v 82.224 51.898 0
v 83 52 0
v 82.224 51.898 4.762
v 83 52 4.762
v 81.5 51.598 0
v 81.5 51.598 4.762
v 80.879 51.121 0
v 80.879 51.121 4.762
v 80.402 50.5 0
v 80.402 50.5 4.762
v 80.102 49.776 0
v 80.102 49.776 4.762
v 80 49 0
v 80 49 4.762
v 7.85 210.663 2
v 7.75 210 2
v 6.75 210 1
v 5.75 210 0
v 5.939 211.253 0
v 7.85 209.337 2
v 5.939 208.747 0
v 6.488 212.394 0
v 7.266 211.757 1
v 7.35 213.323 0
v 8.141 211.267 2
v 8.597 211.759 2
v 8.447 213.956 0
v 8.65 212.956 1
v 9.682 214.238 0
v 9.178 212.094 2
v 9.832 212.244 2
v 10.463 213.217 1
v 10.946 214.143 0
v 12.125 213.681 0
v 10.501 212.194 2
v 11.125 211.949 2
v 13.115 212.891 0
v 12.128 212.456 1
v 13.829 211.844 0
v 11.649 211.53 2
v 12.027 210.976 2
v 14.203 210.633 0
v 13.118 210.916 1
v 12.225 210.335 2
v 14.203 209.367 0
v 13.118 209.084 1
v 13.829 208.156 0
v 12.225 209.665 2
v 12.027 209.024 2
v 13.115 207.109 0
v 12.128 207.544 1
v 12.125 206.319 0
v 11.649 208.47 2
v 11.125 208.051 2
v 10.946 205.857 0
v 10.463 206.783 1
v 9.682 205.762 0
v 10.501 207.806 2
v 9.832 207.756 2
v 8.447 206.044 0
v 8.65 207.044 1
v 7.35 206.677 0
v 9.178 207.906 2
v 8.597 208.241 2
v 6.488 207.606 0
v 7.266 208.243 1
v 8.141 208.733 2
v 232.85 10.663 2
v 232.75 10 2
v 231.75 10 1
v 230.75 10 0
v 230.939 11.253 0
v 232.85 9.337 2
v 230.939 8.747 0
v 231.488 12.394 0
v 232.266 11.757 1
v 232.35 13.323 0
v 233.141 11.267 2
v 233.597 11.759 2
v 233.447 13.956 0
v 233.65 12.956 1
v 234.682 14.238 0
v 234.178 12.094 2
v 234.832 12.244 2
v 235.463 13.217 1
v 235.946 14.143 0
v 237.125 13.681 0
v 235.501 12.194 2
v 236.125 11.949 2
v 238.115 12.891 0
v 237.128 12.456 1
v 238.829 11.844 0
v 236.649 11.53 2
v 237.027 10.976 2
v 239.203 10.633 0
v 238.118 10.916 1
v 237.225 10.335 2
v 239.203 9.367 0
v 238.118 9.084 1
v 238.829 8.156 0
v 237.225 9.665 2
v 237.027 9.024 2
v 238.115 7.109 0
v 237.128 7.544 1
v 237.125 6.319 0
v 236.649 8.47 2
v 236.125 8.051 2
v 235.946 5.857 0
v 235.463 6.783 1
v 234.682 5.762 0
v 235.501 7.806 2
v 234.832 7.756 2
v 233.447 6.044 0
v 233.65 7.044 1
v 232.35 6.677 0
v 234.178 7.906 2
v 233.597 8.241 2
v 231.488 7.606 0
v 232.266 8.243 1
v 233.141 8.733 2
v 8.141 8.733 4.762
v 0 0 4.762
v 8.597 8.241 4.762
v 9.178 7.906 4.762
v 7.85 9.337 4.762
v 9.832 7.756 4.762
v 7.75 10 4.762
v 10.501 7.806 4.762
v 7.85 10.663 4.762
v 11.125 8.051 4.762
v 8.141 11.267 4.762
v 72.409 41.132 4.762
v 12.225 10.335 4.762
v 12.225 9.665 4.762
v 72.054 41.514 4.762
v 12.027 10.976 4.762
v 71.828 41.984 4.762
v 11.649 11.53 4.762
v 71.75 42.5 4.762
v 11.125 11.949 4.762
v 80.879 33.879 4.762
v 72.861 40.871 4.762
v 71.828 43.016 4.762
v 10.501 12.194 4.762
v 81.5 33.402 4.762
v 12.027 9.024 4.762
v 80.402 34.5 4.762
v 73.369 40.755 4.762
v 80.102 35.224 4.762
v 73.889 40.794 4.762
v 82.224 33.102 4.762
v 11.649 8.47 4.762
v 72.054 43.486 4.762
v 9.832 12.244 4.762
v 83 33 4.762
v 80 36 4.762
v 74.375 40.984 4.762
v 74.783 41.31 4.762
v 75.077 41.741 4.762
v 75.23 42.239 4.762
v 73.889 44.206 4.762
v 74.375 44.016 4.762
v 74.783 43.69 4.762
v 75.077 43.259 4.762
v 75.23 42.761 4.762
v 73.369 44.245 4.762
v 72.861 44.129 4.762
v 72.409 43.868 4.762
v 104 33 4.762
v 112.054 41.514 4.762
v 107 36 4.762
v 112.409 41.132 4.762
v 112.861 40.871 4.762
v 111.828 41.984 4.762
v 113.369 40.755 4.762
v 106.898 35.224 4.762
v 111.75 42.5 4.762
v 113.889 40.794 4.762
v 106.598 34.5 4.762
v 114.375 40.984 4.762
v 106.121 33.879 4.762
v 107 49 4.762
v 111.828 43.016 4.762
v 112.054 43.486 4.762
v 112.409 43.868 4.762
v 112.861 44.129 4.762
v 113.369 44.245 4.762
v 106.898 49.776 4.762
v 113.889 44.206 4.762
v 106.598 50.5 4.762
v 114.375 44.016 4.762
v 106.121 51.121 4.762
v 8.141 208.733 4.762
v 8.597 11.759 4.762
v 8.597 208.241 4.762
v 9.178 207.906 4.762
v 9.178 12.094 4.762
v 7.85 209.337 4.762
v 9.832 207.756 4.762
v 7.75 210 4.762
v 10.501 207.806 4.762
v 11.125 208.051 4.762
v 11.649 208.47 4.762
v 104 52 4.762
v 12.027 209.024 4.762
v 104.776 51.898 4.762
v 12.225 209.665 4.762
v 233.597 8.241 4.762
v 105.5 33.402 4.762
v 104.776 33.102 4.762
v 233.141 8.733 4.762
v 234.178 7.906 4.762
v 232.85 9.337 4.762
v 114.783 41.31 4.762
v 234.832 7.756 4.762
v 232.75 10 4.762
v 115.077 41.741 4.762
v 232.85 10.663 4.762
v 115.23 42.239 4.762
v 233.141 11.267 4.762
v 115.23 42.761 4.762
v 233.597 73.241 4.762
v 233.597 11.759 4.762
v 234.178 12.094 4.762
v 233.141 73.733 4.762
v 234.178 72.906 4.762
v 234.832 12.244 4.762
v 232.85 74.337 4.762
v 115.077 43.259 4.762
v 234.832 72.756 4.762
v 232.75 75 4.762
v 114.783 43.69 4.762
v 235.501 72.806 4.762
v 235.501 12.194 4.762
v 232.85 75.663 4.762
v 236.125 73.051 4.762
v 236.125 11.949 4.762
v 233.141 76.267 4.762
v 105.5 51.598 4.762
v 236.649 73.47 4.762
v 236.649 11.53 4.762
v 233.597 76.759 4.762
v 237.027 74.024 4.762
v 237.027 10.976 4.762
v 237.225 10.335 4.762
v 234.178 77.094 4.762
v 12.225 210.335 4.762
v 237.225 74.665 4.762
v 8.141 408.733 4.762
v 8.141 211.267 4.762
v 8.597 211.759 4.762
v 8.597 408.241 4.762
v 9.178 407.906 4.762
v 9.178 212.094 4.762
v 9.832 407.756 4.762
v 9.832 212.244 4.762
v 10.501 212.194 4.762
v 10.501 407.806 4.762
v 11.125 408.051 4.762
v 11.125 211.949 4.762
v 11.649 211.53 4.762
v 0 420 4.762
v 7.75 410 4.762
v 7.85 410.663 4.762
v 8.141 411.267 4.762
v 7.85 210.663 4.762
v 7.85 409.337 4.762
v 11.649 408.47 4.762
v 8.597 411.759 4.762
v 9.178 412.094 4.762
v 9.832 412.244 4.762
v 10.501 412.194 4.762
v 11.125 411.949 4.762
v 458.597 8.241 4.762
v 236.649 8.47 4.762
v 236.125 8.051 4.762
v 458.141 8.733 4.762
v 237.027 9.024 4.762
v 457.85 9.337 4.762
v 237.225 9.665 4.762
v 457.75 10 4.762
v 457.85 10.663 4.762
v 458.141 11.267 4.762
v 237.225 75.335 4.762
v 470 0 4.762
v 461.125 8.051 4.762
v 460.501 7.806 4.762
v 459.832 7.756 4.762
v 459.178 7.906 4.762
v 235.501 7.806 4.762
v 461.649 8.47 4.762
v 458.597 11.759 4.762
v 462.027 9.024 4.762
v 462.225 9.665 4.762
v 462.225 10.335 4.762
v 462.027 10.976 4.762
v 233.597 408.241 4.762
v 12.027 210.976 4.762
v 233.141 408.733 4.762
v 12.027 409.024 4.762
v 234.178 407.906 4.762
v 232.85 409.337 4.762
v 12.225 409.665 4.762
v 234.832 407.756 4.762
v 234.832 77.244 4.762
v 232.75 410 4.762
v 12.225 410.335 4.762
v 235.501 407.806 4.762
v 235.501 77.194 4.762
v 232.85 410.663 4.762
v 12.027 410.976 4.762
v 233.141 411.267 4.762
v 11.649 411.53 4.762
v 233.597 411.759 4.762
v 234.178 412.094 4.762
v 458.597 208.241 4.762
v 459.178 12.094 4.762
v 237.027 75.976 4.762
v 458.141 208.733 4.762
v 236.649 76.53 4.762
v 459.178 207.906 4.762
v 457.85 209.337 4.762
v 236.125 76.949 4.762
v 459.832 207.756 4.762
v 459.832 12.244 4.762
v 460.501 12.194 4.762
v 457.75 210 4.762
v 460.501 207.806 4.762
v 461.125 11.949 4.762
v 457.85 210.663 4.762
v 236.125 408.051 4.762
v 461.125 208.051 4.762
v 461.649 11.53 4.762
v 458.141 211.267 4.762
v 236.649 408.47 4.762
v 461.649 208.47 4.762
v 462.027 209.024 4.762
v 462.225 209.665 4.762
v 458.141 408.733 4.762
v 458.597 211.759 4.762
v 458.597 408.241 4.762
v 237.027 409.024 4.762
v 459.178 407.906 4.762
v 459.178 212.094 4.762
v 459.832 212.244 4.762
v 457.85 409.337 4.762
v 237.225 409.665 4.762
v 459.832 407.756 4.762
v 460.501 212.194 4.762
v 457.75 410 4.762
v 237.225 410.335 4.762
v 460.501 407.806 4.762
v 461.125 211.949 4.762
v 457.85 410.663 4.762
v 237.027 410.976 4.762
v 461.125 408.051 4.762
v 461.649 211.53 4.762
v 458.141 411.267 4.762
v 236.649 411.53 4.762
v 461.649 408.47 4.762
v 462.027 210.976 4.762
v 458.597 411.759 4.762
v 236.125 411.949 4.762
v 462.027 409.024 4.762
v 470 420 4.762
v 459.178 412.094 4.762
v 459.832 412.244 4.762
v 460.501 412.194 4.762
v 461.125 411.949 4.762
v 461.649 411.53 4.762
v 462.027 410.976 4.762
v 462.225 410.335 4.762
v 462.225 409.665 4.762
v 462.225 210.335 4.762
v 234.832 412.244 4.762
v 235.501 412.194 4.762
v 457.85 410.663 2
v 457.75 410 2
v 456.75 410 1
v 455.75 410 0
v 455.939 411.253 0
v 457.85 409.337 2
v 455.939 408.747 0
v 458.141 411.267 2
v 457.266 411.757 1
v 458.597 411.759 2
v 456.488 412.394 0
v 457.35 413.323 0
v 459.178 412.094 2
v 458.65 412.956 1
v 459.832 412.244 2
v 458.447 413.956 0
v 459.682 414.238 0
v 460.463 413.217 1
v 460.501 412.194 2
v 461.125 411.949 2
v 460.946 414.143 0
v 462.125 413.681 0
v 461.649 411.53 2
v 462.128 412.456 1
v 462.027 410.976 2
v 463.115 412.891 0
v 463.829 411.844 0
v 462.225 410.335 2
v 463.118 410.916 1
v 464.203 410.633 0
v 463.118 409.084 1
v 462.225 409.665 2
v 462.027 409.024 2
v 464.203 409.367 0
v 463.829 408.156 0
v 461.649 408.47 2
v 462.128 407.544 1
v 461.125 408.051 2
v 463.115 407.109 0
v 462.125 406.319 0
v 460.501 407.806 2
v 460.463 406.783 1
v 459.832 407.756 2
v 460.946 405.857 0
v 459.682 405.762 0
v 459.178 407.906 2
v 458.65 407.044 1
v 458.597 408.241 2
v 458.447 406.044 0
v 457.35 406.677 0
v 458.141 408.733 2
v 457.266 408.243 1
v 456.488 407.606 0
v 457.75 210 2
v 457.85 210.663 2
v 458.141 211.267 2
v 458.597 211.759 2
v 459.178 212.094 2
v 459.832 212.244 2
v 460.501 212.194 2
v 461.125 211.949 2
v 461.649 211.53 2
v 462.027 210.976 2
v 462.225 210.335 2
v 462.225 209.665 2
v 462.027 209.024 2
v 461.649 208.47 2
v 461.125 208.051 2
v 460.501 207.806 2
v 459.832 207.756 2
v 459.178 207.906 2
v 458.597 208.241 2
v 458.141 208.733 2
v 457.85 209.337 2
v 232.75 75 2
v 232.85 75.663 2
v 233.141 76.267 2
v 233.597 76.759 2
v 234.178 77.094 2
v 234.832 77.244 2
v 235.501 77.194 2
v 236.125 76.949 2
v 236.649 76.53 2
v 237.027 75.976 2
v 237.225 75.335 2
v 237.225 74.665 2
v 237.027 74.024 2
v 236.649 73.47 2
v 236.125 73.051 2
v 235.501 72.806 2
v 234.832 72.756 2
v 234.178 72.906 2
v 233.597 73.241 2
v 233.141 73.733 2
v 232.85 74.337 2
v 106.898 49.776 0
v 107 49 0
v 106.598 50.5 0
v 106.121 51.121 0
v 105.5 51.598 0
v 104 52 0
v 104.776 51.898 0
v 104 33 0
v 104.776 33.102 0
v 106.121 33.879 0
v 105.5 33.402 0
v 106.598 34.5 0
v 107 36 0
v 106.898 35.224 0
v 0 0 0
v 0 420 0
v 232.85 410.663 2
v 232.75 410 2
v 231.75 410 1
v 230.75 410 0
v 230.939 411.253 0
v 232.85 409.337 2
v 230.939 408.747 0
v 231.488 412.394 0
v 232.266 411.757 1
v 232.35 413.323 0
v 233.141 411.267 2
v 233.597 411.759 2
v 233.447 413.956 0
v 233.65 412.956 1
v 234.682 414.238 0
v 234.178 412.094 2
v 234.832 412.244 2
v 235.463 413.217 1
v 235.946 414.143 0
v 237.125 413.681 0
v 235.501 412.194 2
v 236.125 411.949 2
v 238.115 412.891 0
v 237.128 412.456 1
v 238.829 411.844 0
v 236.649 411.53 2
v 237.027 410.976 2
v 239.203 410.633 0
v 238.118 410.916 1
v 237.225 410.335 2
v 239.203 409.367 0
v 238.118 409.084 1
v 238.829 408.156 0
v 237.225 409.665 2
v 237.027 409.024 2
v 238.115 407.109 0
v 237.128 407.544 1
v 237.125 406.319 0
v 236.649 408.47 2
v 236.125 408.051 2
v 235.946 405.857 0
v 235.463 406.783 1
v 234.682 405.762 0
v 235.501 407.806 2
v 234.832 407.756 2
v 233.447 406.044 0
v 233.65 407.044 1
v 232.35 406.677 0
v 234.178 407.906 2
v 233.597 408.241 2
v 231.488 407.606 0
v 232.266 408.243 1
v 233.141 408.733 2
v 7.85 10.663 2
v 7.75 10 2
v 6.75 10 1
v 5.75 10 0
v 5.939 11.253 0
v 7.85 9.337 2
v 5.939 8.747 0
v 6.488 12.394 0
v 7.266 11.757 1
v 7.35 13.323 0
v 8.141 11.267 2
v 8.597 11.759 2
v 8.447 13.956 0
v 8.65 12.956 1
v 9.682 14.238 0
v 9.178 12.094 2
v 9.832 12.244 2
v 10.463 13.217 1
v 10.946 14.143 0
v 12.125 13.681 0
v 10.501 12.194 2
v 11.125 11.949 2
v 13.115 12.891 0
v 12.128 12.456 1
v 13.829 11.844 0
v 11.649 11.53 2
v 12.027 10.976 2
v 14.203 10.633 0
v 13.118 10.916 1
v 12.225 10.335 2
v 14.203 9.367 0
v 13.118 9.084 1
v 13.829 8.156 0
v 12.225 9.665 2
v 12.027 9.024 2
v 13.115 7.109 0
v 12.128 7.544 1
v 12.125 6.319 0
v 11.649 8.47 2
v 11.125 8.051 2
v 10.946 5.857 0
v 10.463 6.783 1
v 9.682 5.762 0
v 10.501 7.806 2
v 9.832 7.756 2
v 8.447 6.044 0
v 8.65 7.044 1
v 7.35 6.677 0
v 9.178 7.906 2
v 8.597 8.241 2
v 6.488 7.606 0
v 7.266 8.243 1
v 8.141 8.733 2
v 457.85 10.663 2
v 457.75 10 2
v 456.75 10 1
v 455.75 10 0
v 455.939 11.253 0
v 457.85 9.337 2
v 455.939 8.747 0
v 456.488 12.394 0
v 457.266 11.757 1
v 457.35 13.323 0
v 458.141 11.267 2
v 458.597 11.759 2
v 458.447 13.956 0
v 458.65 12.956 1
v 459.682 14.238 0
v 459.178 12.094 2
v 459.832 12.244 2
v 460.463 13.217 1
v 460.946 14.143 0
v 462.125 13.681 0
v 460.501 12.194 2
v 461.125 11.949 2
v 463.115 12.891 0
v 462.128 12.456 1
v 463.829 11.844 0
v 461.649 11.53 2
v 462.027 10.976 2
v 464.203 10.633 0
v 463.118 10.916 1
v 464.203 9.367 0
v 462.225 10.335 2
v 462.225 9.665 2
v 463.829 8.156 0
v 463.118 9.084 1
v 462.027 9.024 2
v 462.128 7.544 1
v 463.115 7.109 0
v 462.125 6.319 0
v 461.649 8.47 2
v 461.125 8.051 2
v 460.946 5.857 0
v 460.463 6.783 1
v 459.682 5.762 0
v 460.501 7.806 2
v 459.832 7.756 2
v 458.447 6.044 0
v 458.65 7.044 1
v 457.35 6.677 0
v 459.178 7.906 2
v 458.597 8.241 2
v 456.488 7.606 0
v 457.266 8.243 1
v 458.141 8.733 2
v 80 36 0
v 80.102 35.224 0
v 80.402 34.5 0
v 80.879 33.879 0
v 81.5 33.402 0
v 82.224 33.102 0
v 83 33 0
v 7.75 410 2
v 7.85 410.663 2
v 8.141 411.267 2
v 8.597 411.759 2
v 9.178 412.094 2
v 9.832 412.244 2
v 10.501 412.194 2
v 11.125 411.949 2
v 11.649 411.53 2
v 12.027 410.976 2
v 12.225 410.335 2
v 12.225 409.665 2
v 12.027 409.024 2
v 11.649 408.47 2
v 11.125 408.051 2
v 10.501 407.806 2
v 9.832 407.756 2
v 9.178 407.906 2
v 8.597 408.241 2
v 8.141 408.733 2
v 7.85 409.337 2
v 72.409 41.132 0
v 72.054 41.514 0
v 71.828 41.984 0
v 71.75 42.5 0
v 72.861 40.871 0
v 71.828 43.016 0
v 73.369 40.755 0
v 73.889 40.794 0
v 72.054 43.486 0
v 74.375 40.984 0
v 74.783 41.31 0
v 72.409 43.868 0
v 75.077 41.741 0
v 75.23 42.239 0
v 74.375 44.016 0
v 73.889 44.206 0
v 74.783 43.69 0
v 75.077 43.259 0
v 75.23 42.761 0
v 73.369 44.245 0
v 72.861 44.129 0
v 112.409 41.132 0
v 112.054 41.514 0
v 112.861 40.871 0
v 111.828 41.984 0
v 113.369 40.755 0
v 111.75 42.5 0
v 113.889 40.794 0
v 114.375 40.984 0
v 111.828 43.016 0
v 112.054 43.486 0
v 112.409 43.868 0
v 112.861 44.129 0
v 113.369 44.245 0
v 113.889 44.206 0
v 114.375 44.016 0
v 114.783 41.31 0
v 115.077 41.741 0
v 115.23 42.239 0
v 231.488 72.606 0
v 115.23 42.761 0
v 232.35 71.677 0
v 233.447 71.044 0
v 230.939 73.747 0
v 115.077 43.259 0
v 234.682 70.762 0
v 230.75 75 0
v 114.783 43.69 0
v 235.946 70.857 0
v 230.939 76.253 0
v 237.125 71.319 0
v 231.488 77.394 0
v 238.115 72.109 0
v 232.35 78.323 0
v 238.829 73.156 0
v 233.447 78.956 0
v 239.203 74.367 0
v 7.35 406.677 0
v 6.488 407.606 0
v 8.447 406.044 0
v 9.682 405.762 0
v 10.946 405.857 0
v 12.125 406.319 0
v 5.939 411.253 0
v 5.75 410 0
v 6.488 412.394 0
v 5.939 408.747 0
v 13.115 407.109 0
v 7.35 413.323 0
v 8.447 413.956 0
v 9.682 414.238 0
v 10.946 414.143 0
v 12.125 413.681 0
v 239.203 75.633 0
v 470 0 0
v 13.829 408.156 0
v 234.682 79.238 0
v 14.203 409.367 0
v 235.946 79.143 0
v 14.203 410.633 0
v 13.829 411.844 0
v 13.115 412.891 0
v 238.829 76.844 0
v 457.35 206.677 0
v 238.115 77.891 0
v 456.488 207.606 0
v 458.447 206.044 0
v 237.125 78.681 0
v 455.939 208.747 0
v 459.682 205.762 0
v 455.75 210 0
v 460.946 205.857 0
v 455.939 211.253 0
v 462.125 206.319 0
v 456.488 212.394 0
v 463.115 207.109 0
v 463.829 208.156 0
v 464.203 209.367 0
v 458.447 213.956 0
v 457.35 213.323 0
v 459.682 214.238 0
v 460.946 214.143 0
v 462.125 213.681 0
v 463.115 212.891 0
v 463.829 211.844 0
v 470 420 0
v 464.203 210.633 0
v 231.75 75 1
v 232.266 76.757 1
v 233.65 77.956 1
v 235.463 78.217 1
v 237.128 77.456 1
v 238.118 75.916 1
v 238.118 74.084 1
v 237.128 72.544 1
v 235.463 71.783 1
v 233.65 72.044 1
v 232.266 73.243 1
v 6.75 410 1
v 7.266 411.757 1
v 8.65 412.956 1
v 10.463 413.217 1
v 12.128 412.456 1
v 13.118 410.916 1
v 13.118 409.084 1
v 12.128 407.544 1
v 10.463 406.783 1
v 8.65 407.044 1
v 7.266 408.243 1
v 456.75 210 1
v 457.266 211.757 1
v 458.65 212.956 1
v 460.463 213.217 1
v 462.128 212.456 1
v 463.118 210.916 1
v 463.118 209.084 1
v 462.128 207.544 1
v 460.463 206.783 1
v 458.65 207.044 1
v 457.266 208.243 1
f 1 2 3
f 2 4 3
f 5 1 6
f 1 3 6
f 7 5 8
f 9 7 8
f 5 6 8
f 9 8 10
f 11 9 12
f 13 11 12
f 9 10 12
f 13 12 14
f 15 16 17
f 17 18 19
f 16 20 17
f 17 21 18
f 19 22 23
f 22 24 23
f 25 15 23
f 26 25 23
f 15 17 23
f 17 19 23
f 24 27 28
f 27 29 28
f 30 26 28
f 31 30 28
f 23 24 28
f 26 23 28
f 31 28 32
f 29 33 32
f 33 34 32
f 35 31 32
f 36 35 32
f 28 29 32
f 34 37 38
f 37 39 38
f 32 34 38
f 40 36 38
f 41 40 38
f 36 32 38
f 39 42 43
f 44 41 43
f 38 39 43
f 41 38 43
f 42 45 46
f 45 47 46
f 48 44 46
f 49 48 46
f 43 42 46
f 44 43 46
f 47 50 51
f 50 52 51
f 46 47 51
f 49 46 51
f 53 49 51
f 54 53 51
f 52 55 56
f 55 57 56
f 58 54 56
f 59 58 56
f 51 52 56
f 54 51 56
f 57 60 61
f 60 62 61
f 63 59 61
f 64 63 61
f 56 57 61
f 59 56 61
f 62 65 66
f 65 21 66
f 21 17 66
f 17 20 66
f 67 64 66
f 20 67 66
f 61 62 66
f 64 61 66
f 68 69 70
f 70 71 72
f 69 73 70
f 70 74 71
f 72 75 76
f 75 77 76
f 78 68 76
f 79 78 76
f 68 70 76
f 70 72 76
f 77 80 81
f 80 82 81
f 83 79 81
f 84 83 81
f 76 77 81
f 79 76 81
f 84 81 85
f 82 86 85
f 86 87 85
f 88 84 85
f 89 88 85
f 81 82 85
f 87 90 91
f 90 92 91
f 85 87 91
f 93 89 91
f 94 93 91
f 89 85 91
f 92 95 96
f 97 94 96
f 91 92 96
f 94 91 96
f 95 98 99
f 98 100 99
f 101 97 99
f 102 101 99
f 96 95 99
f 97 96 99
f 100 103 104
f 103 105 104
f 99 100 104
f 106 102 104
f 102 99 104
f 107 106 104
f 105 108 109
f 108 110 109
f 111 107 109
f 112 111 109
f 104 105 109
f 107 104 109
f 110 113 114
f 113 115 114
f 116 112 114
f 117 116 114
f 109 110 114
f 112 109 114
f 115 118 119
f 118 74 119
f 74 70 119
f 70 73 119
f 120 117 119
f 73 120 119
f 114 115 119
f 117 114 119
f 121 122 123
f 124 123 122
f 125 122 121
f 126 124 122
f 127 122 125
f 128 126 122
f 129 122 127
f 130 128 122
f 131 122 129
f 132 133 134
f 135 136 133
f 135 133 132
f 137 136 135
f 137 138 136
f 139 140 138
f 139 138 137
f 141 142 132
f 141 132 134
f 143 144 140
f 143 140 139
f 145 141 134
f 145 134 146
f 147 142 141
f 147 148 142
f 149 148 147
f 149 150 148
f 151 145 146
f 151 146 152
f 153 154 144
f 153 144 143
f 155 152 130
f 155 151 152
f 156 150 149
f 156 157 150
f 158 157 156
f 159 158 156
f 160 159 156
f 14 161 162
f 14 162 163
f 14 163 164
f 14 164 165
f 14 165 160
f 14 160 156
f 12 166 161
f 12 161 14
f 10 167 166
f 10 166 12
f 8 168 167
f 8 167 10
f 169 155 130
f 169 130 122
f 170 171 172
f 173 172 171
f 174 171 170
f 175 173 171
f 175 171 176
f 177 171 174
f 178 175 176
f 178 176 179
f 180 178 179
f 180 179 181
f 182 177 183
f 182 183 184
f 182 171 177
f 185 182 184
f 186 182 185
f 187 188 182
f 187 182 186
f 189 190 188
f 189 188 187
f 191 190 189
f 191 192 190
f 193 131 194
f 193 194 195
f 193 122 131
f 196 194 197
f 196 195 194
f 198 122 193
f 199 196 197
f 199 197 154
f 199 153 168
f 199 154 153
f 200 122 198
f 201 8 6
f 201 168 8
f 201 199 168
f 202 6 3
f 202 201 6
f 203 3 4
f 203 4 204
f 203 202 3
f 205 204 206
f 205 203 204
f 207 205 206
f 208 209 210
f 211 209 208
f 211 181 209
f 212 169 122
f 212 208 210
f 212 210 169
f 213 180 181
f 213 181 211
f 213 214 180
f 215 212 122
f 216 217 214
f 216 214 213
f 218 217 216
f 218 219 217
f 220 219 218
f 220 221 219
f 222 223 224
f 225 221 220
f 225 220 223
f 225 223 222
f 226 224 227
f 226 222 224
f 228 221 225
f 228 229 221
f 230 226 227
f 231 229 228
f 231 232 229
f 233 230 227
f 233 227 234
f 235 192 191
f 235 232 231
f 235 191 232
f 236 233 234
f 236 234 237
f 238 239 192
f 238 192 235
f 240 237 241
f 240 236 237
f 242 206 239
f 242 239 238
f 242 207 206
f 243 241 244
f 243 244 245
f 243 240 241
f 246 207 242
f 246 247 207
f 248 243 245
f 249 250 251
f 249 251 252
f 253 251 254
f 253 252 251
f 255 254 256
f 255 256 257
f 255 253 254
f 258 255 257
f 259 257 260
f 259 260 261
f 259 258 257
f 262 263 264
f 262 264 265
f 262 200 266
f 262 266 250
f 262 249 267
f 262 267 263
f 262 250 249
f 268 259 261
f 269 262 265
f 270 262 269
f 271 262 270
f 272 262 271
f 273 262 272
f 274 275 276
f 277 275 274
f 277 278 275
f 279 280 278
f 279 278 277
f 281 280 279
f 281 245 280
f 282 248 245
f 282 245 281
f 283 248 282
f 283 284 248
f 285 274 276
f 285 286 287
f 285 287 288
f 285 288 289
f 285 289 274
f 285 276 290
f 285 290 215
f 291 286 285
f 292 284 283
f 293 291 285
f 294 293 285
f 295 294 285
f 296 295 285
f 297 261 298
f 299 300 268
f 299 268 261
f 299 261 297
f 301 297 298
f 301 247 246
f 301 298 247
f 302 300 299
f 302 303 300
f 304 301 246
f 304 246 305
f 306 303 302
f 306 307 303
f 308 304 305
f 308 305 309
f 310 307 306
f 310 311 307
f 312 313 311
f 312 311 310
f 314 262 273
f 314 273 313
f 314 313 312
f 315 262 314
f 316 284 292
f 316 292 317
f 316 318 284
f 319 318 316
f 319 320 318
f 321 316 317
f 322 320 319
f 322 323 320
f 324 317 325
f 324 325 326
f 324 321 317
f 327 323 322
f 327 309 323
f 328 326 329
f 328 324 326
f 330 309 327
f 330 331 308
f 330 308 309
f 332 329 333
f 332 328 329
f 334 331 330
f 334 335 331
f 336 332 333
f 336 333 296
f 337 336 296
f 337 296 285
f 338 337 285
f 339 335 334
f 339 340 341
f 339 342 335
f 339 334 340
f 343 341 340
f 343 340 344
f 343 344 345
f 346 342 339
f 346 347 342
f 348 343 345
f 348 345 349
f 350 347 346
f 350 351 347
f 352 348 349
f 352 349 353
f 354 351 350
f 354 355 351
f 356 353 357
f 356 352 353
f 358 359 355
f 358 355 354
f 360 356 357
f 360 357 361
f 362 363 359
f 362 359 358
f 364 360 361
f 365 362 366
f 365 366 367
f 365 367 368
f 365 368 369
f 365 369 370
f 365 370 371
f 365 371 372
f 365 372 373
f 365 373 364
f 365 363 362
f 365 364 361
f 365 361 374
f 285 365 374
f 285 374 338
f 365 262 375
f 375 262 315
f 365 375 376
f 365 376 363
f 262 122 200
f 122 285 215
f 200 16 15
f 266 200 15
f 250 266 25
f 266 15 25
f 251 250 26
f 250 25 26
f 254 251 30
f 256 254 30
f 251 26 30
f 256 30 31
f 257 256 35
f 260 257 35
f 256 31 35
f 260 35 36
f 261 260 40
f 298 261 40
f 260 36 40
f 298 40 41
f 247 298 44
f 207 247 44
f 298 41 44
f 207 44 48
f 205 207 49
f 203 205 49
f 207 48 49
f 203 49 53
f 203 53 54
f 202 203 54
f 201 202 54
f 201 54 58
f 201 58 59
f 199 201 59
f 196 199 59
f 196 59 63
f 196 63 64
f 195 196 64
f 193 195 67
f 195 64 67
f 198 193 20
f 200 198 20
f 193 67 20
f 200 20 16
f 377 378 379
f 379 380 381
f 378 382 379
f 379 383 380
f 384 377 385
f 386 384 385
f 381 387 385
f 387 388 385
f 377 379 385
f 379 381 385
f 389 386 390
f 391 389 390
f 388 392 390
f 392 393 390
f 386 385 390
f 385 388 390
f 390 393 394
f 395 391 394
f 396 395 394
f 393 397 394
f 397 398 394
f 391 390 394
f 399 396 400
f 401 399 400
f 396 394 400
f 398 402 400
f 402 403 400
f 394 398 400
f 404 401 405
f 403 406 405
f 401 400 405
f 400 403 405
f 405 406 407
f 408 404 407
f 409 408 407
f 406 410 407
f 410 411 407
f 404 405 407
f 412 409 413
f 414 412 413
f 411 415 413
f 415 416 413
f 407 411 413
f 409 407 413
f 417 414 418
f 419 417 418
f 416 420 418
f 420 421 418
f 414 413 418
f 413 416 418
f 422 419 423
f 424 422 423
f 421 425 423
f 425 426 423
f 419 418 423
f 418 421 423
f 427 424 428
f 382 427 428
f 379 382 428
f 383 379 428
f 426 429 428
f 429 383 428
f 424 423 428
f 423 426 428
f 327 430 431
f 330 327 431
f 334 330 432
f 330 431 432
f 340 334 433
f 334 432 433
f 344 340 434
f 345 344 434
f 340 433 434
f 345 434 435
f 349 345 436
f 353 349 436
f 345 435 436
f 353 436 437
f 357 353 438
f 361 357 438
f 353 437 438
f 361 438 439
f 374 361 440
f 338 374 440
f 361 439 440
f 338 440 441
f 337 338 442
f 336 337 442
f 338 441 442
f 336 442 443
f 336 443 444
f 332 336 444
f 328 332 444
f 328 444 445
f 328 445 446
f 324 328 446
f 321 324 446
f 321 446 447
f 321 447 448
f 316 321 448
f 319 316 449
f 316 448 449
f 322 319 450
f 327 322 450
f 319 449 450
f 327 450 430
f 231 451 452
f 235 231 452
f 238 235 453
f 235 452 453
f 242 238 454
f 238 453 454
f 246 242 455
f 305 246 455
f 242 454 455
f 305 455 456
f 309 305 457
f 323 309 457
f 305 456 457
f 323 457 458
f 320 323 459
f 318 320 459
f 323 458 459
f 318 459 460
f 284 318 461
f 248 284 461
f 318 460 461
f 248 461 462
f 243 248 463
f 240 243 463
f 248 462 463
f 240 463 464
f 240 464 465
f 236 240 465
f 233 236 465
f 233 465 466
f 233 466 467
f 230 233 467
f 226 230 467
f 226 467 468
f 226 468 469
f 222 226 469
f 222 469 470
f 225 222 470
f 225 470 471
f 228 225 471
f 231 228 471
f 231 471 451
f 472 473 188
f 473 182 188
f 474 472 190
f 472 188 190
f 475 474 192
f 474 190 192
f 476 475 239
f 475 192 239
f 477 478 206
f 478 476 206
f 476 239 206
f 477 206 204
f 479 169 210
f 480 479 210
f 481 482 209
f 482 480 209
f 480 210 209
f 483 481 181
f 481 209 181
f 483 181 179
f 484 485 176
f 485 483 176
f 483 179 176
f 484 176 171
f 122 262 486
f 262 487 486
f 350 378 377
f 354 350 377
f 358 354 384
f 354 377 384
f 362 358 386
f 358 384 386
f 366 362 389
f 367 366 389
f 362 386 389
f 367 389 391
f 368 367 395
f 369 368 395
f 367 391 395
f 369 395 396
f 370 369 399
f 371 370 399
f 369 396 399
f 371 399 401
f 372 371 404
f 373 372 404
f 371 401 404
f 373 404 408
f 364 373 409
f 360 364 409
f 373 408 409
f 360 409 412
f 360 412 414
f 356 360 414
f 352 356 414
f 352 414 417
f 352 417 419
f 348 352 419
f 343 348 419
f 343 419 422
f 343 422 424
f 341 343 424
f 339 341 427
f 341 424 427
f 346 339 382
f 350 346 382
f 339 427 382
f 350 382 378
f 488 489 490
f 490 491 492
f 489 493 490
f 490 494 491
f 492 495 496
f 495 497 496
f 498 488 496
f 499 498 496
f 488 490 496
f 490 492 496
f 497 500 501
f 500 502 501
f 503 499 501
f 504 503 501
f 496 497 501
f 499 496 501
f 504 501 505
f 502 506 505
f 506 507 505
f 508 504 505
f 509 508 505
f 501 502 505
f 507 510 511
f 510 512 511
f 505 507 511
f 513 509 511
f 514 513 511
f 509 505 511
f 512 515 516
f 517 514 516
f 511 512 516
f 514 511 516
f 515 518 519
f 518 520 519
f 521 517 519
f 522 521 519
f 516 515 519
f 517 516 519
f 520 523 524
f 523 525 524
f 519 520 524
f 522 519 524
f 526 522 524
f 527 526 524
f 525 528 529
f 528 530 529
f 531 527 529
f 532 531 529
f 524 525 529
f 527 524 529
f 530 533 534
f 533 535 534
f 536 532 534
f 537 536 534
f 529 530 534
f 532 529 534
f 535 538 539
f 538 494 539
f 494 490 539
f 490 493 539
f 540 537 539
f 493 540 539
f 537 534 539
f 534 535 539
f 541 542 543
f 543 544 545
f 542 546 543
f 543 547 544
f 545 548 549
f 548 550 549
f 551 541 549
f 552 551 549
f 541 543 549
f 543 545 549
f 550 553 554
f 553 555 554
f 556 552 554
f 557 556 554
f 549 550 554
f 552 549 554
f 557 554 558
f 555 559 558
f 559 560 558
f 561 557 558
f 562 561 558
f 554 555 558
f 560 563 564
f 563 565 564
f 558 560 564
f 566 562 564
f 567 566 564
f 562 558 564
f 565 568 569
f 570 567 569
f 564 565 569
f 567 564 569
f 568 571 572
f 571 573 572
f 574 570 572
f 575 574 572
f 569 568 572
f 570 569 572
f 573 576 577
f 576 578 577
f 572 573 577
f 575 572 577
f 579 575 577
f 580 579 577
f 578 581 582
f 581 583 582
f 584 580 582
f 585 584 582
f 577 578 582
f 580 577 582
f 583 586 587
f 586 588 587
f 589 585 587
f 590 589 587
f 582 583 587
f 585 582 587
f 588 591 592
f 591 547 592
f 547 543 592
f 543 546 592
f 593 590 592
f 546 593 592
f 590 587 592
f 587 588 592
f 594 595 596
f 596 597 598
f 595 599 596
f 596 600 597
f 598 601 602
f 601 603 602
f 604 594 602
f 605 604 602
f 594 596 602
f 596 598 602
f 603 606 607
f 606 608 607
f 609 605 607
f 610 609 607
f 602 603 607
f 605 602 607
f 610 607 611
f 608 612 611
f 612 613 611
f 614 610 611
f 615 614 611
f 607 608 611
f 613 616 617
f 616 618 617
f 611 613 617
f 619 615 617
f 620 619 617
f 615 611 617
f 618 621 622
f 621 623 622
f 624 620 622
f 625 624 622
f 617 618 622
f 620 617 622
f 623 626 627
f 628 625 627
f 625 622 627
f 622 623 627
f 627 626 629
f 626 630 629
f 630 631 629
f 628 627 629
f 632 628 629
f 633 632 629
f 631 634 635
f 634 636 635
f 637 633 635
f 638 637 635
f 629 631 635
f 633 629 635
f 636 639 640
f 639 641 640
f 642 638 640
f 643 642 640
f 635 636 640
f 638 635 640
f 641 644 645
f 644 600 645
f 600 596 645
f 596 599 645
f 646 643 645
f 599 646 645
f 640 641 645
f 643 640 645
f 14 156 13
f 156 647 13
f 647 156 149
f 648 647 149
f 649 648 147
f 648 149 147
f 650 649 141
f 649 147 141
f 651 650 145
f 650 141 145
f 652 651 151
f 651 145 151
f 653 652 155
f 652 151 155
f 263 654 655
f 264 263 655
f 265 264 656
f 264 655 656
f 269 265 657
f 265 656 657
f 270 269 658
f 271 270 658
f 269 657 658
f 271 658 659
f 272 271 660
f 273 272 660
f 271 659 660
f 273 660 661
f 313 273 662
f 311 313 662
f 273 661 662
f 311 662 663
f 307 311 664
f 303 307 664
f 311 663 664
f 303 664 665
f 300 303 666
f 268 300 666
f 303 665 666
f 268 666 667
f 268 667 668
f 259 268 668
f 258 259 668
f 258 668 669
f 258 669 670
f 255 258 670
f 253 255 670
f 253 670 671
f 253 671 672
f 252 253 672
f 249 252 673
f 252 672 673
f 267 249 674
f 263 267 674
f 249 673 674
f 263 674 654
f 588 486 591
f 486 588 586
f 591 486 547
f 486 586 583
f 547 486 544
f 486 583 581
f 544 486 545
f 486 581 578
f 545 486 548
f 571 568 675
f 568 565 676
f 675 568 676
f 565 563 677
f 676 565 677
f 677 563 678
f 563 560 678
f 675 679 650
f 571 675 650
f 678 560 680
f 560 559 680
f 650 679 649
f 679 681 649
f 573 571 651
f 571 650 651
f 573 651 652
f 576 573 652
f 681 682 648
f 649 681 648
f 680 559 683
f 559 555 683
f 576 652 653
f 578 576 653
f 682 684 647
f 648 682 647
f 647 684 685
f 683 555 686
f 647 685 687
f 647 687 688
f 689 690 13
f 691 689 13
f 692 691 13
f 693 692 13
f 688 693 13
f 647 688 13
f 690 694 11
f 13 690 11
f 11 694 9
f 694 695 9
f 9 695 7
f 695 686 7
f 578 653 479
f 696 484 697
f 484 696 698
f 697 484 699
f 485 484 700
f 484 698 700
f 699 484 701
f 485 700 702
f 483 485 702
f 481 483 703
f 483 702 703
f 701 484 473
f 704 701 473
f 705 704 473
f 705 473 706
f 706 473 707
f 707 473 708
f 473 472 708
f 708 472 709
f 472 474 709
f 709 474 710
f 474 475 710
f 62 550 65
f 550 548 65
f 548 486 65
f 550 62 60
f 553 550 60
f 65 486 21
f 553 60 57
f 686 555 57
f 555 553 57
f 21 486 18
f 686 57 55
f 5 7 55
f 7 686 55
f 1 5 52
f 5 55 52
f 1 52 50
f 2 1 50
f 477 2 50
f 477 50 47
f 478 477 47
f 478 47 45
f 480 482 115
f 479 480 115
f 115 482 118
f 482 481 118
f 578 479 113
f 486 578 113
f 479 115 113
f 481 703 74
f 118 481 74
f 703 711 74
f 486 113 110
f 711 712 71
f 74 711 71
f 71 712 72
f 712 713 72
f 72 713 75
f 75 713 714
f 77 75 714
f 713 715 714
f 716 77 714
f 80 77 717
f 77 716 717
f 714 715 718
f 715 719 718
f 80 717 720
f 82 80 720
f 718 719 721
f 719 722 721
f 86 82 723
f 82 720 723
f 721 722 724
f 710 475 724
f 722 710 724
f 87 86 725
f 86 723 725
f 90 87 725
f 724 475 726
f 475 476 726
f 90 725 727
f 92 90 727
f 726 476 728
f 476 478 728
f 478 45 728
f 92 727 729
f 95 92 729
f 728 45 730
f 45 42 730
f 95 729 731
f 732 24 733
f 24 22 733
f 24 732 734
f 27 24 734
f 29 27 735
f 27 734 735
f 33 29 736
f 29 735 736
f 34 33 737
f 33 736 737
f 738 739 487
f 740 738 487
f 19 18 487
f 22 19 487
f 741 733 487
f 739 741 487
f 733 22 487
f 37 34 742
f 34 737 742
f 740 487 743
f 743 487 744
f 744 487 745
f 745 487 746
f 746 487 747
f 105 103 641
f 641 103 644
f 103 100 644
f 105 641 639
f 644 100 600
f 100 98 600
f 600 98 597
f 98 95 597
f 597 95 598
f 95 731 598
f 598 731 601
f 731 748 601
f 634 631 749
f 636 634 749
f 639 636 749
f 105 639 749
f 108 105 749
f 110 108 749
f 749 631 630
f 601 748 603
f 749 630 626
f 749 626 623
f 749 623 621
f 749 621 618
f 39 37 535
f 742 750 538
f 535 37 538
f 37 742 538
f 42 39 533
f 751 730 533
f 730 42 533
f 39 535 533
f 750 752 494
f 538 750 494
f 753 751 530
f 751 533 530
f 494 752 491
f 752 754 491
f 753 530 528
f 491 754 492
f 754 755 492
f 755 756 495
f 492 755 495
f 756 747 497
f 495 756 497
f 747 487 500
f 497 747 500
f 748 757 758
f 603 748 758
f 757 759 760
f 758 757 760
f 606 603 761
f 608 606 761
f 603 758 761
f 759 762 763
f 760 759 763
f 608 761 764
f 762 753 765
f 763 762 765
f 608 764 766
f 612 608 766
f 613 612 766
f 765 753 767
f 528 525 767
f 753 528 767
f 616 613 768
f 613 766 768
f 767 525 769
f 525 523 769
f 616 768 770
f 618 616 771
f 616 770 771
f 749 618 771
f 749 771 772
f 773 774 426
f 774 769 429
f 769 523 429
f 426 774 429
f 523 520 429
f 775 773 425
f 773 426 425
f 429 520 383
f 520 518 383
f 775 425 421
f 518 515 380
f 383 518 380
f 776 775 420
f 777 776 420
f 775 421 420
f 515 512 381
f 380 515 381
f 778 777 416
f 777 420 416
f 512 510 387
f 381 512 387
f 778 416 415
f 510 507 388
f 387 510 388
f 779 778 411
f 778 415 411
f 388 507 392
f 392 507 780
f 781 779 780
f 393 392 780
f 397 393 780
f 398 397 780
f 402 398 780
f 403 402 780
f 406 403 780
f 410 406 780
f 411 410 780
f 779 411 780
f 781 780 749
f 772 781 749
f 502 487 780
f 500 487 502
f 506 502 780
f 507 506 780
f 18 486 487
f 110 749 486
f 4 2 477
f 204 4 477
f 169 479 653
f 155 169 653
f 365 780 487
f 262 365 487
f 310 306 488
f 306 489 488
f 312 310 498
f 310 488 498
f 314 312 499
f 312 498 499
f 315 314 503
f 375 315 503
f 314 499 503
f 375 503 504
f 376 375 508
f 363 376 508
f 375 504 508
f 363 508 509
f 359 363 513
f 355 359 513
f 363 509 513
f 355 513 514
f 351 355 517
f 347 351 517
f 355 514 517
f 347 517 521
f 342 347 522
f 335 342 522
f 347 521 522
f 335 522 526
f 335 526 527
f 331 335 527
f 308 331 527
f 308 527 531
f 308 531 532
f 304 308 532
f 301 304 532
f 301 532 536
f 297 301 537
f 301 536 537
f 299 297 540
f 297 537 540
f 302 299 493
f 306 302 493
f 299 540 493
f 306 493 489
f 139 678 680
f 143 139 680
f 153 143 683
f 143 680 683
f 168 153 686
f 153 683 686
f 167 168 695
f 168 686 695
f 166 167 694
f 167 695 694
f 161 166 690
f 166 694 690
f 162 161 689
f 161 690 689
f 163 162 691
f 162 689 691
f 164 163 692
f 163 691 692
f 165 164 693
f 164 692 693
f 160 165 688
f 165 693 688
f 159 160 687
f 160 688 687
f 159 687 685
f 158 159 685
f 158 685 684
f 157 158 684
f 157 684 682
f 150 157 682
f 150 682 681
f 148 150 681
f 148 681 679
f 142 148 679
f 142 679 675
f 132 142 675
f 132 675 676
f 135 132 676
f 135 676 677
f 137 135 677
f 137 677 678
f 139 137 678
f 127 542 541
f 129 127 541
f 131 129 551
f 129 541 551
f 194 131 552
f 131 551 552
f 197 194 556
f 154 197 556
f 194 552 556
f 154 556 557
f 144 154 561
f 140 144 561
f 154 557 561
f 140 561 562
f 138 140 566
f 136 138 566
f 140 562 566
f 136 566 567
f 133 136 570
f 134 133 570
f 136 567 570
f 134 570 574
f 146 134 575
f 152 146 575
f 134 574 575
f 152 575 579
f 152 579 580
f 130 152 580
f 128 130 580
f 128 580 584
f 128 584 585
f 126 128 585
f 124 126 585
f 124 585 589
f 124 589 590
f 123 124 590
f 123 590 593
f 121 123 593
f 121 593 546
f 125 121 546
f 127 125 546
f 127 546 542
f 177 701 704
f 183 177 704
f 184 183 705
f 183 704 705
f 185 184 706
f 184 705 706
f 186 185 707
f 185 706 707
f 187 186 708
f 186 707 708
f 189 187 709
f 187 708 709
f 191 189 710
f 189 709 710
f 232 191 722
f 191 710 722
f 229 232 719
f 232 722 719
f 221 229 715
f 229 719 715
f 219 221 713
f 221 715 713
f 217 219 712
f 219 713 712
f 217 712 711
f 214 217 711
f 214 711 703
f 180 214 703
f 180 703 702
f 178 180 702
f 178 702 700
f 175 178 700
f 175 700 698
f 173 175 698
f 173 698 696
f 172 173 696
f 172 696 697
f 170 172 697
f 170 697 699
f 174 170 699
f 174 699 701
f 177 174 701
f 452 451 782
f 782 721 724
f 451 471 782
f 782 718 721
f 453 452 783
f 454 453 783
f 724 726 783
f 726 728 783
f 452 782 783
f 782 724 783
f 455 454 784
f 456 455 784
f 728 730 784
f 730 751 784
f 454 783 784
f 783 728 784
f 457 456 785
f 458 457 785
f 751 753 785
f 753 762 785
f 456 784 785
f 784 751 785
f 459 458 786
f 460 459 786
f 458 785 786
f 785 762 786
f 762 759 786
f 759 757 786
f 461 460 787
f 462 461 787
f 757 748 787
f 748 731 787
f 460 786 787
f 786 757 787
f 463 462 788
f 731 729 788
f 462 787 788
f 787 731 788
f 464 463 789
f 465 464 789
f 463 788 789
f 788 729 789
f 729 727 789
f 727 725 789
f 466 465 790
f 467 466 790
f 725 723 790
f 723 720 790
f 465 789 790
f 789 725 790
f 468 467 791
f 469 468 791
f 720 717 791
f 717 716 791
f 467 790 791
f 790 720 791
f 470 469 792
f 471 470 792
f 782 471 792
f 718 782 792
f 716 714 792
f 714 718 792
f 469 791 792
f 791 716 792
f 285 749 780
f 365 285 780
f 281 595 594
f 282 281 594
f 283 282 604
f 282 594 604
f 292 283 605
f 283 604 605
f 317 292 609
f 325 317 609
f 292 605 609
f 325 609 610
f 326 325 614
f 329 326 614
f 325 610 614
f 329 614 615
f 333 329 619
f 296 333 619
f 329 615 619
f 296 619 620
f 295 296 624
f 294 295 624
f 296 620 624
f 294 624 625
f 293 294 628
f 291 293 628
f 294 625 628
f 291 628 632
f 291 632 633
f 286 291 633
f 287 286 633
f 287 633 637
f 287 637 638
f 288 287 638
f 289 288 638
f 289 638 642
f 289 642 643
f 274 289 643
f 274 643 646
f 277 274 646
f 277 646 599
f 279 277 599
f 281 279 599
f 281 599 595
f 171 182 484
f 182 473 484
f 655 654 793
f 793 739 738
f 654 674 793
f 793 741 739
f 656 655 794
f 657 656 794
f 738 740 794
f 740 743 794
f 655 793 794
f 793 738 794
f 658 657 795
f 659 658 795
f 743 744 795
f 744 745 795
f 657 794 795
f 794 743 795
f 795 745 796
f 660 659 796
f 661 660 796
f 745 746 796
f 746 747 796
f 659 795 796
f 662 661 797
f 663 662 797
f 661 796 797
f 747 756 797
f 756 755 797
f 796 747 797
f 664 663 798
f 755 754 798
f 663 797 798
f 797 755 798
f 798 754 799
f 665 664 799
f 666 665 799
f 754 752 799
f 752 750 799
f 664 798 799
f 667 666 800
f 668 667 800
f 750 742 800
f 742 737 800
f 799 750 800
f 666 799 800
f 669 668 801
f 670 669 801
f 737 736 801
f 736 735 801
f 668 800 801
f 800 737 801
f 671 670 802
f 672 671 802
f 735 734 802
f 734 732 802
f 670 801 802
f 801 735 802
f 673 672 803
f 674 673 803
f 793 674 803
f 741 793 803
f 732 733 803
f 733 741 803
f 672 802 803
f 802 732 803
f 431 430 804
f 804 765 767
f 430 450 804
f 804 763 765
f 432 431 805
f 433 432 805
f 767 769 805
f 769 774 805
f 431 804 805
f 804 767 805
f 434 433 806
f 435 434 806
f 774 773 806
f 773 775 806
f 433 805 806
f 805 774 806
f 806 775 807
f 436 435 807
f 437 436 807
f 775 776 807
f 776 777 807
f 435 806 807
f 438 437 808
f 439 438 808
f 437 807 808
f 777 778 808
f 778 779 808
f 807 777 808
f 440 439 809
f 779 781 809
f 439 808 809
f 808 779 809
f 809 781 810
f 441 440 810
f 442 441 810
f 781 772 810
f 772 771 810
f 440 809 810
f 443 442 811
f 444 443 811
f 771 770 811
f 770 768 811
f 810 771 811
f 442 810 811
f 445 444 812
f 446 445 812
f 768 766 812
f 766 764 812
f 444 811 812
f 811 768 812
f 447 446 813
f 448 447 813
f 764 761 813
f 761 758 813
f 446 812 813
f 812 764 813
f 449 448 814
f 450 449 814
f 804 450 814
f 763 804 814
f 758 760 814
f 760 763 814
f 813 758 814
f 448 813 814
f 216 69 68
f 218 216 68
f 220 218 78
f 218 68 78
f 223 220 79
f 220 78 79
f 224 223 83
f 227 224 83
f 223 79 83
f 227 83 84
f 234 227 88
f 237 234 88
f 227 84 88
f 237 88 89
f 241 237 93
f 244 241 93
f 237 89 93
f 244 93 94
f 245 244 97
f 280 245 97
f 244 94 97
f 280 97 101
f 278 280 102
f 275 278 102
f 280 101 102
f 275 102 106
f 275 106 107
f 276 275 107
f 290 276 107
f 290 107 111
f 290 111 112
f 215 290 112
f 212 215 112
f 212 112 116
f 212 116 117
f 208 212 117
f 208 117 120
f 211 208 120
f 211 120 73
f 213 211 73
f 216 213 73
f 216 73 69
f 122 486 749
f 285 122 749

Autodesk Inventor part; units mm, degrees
ref_plane "YZ Plane" through (0, 0, 0) normal (1, 0, 0) x (0, 1, 0)
ref_plane "XZ Plane" through (0, 0, 0) normal (0, 1, 0) x (-1, 0, 0)
ref_plane "XY Plane" through (0, 0, 0) normal (0, 0, 1) x (1, 0, 0)
sketch "Sketch1" plane through (0, 0, 0) normal (0, 0, 1) x (1, 0, 0)
  line L0 (0, 0) -> (470, 0)
  line L1 (470, 0) -> (470, 420)
  line L2 (470, 420) -> (0, 420)
  line L3 (0, 420) -> (0, 0)
  dimension "d0" = 470
  dimension "d1" = 420
extrude "Extrusion1" add sketch "Sketch1" along normal blind 4.7625
sketch "Sketch2" plane through (0, 0, 0) normal (0, 0, -1) x (-1, 0, 0)
  line L0 (0, 0) -> (-470, 0) projected
  line L1 (0, 420) -> (0, 0) projected
  line L2 (-107, 33) -> (-80, 33)
  line L3 (-80, 33) -> (-80, 52)
  line L4 (-80, 52) -> (-107, 52)
  line L5 (-107, 52) -> (-107, 33)
  dimension "d4" = 27
  dimension "d5" = 19
  dimension "d6" = 33
  dimension "d7" = 80
extrude "Extrusion2" cut sketch "Sketch2" against normal up to next
sketch "Sketch3" plane through (0, 0, 0) normal (0, 0, -1) x (-1, 0, 0)
  line L0 (-80, 52) -> (-80, 33) projected
  line L1 (-107, 52) -> (-80, 52) projected
  circle A0 centre (-113.5, 42.5) radius 1.75
  circle A1 centre (-73.5, 42.5) radius 1.75
  dimension "d10" = 3.5
  dimension "d11" = 40
  dimension "d12" = 6.5
  dimension "d13" = 9.5
extrude "Extrusion3" cut sketch "Sketch3" against normal up to next
sketch "Sketch4" plane through (0, 0, 0) normal (0, 0, -1) x (-1, 0, 0)
  line L0 (0, 0) -> (-470, 0) projected
  line L1 (0, 420) -> (0, 0) projected
  line L2 (-470, 420) -> (0, 420) projected
  line L3 (-470, 0) -> (-470, 420) projected
  circle A0 centre (-460, 410) radius 2.25
  circle A1 centre (-10, 410) radius 2.25
  circle A2 centre (-10, 10) radius 2.25
  circle A3 centre (-460, 10) radius 2.25
  circle A4 centre (-235, 410) radius 2.25
  circle A5 centre (-235, 10) radius 2.25
  circle A6 centre (-10, 210) radius 2.25
  circle A7 centre (-460, 210) radius 2.25
  circle A8 centre (-235, 75) radius 2.25
  dimension "d16" = 10
  dimension "d17" = 4.5
  dimension "d18" = 10
  dimension "d19" = 10
  dimension "d20" = 10
  dimension "d21" = 210
  dimension "d22" = 235
  dimension "d23" = 75
extrude "Extrusion4" cut sketch "Sketch4" against normal up to next contours A0 | A1 | A2 | A3 | A4 | A5 | A6 | A7 | A8
chamfer "Chamfer1" distance 2 angle 45 9 edges at (462.25, 410, 0) (237.25, 410, 0) (12.25, 410, 0) (12.25, 210, 0) (237.25, 75, 0) (237.25, 10, 0) (12.25, 10, 0) (462.25, 10, 0) (462.25, 210, 0)
fillet "Fillet1" radius 3 4 edges at (80, 33, 2.3813) (80, 52, 2.3813) (107, 52, 2.3813) (107, 33, 2.3813)
properties part number "EnclosurePanelBack" material "ABS Plastic"
